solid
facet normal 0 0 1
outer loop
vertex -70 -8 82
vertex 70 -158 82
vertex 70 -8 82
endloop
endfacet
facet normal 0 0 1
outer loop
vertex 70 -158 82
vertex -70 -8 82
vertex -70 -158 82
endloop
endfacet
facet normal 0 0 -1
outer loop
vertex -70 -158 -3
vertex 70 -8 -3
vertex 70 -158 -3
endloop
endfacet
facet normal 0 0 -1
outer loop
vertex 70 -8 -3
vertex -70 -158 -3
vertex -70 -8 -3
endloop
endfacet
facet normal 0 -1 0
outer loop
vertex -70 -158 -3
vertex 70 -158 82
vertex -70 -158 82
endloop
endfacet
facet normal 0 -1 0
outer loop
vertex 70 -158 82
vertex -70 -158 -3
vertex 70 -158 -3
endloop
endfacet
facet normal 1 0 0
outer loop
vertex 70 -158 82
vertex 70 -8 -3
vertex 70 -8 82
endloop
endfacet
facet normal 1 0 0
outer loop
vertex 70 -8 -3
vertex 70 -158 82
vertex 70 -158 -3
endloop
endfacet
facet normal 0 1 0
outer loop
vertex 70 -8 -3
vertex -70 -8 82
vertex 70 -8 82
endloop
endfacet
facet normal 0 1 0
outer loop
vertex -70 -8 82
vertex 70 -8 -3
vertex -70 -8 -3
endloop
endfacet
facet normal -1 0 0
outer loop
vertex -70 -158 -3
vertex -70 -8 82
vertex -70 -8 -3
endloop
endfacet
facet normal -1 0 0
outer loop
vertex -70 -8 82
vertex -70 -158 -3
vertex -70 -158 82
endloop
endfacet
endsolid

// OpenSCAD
// file: inc/fix-disque.scad
fixAxis();

module fixAxis(){
		difference(){
			union(){
				translate([0,0,-2.99])
          		linear_extrude (height=3)
                  import (file="motor-dc-m15n.dxf", layer="fixation-axe2", $fn=100);
			
          linear_extrude (height=7)
                  import (file="motor-dc-m15n.dxf", layer="fixation-axe", $fn=100);
			}
			union(){
				
				translate([0,-11,4])
					rotate([270,0,0])
					cylinder(r=1.5,h=22,$fn=100);
			}
	}
}
// file: inc/disque.scad
disque();

module disque(){
linear_extrude (height=2)
                  import (file="motor-dc-m15n.dxf", layer="disque", $fn=100);

}
// file: inc/motor-suport.scad
use <motor-dc-m15n.scad>
//m15n3();

motorSupport();
module motorSupport(){
	difference(){
		union(){
			linear_extrude (height=19)
                  import (file="motor-dc-m15n.dxf", layer="support", $fn=100);
			translate([0,0,-2.99])
				linear_extrude (height=3)
                  import (file="motor-dc-m15n.dxf", layer="support-front", $fn=100);
		}
		union(){
			translate([-14.8472,0,0])
				rotate([90,0,0])
					cylinder(h = 8, r = 1.5, $fn=100);

			translate([14.8472,0,0])
				rotate([90,0,0])
					cylinder(h = 8, r = 1.5, $fn=100);

			translate([-14.8472,0,16])
				rotate([90,0,0])
					cylinder(h = 8, r = 1.5, $fn=100);

			translate([14.8472,0,16])
				rotate([90,0,0])
					cylinder(h = 8, r = 1.5, $fn=100);
			
		}
	}
}
// file: inc/motor-dc-m15n.scad
m15n3();
module m15n3(){
    difference(){
        union(){
            linear_extrude (height=19)
                  import (file="motor-dc-m15n.dxf", layer="0", $fn=100);
            translate([0,0,-1.5])
                linear_extrude (height=21)
                  import (file="motor-dc-m15n.dxf", layer="1", $fn=100); 
             translate([0,0,-7.6])
                linear_extrude (height=41)
                  import (file="motor-dc-m15n.dxf", layer="2-axis", $fn=100);
              translate([0,0,18.9])
                linear_extrude (height=3.1)
                  import (file="motor-dc-m15n.dxf", layer="back-elec", $fn=100);  
        } 
        translate([0,0,-0.1])
                linear_extrude (height=5)
                  import (file="motor-dc-m15n.dxf", layer="screws-holes", $fn=100); 
    }
}
// main file
use <inc/motor-dc-m15n.scad>
m15n3();
use <inc/motor-suport.scad>
motorSupport();
use <inc/disque.scad>
translate([0,0,-17]) disque();
use <inc/fix-disque.scad>
translate([0,0,-10.5])fixAxis();

//bolitier alim atx 85 x 140 x 150 mm
	translate ([-70,-158,-3])
	cube(size = [140,150,85], center = false);
